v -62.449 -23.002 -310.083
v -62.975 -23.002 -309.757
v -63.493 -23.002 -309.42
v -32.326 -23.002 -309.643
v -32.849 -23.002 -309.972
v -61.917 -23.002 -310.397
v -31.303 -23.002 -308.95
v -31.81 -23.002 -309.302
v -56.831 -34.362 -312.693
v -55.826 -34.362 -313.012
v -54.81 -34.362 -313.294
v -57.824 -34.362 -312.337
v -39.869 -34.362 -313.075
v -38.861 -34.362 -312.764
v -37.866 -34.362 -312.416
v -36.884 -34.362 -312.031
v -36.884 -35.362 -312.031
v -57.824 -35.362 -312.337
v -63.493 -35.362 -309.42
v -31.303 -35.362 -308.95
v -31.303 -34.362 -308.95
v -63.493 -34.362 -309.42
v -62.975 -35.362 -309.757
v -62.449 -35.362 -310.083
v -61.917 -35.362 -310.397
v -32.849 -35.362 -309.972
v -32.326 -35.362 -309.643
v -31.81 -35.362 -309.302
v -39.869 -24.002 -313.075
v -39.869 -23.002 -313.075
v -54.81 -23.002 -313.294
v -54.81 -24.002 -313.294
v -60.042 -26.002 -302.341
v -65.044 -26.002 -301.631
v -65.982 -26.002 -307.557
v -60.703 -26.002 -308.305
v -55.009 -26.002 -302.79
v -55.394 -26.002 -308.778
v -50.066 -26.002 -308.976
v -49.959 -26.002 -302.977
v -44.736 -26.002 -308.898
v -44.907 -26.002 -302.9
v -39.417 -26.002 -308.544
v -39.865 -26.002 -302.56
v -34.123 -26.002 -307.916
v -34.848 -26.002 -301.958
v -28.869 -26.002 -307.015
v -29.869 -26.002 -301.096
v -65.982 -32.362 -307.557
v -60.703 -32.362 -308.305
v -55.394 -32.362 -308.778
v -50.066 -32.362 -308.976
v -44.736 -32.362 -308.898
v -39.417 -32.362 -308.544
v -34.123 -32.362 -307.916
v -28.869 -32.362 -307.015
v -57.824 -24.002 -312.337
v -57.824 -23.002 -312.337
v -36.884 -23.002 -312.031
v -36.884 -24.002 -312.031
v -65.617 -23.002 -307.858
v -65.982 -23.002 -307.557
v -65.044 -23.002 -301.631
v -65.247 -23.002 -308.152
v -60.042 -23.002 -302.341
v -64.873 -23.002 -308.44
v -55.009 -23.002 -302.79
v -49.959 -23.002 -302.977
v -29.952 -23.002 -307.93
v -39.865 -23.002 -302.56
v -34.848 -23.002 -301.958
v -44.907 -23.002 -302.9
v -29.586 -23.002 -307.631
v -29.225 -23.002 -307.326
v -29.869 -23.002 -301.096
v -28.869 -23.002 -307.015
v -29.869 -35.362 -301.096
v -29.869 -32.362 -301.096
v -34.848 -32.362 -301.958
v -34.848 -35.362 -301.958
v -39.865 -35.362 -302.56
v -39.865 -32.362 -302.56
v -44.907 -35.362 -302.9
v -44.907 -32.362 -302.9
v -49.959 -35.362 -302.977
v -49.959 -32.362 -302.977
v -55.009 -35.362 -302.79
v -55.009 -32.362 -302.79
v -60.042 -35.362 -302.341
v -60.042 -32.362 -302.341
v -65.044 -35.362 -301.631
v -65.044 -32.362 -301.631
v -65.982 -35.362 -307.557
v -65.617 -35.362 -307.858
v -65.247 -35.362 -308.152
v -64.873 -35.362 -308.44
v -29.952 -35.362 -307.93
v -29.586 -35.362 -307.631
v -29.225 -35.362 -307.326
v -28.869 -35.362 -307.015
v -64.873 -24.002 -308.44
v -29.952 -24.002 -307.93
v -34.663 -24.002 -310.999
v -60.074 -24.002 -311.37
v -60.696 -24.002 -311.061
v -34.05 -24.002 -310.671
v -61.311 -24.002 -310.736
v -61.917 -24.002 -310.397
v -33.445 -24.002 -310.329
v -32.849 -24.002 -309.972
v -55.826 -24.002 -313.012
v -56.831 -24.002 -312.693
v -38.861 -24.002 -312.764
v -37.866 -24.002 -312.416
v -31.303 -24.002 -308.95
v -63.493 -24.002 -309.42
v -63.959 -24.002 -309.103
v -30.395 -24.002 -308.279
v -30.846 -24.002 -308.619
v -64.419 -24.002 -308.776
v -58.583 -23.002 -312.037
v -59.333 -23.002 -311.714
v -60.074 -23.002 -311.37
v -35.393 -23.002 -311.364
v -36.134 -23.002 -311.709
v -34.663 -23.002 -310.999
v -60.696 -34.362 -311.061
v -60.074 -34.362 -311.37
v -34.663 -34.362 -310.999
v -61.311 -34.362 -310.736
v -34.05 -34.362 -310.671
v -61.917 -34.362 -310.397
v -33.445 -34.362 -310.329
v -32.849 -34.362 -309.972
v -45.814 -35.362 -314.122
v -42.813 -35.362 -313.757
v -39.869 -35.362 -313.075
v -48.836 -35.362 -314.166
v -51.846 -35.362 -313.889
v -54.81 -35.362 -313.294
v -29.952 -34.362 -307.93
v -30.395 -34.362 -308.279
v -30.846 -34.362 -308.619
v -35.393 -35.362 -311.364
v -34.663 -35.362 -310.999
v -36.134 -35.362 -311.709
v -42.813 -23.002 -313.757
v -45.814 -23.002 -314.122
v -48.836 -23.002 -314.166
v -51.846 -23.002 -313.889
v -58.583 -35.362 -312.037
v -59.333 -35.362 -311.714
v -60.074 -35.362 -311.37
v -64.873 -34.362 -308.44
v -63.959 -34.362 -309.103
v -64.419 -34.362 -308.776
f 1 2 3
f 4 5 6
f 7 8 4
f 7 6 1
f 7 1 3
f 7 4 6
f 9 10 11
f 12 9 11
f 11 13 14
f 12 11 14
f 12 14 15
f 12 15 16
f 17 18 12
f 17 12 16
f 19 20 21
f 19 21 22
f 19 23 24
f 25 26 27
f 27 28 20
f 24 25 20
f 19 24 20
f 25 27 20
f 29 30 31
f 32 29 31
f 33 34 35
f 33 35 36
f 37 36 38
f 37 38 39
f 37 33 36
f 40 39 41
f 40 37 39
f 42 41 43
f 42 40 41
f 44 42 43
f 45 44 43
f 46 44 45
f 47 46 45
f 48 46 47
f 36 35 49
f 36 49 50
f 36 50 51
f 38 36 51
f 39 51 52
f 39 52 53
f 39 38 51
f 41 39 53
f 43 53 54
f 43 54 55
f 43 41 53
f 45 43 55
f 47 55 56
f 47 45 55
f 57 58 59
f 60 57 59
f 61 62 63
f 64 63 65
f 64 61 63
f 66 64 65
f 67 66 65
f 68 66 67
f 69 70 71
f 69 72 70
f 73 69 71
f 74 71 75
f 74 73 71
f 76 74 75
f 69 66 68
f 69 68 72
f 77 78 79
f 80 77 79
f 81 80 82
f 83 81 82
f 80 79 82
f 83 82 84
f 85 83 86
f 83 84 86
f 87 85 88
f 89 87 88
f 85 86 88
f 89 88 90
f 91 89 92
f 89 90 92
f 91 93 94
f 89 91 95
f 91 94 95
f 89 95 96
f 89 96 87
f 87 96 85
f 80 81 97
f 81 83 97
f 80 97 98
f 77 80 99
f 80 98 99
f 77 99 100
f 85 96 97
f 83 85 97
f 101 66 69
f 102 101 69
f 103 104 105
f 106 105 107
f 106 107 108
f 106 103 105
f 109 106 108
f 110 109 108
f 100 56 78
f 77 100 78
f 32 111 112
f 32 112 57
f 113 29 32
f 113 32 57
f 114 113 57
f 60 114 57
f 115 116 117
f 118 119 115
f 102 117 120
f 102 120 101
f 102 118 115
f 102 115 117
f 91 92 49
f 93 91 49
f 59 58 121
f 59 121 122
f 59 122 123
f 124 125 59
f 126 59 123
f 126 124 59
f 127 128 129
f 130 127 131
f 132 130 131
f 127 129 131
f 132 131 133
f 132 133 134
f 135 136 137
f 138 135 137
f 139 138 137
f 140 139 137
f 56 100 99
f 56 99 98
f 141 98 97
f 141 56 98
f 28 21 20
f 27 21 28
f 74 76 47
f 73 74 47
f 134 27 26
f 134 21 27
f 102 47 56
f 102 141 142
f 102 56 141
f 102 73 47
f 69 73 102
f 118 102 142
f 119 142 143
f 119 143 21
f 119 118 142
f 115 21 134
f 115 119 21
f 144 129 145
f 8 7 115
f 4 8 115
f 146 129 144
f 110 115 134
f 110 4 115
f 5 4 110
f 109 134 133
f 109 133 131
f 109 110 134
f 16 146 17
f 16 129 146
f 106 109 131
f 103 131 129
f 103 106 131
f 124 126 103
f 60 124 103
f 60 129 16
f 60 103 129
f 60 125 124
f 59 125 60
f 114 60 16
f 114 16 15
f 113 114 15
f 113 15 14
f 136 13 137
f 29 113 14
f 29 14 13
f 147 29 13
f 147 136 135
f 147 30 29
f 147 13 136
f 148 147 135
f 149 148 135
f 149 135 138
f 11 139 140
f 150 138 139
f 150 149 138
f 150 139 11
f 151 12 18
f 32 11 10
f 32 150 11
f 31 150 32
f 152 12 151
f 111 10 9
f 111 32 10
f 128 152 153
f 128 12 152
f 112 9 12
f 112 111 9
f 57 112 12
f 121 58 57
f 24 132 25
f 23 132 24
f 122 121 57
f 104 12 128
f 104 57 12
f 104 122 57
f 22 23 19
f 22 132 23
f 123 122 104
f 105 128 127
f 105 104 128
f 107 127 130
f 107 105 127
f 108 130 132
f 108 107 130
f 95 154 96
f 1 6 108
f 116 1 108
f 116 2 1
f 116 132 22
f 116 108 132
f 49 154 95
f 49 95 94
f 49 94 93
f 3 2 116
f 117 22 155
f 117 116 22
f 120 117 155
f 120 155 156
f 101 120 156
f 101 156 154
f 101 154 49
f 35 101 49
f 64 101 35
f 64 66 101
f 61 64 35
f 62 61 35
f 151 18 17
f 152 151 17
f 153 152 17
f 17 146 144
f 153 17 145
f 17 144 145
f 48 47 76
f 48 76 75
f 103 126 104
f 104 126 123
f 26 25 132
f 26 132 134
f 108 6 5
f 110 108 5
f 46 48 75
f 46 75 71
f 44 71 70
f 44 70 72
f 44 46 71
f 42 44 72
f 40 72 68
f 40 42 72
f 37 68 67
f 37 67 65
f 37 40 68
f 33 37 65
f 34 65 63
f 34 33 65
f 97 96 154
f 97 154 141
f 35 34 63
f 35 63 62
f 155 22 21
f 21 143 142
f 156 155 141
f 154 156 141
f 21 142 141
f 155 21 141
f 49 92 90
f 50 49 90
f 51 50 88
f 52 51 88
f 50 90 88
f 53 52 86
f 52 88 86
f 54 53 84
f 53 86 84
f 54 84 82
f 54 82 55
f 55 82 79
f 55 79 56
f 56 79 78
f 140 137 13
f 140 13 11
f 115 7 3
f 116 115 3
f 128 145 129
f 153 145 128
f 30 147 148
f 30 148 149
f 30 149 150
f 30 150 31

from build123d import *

# Parameters (mm, degrees)
BOSS_EXTRUDE1_DEPTH = 3
BOSS_EXTRUDE2_START = -6.36
BOSS_EXTRUDE2_DEPTH = 3
BOSS_EXTRUDE3_START = -3
BOSS_EXTRUDE3_DEPTH = 12.36
CUT_EXTRUDE1_DEPTH  = 1


with BuildPart() as part:
    # Sketch1 → Boss-Extrude1 (new body)
    with BuildSketch(Plane.XZ.offset(32.361588827)):
        with BuildLine():
            Line((-28.868957331, -307.014773368), (-29.868957331, -301.096085324))
            ThreePointArc((-29.868957331, -301.096085324), (-47.432277428, -302.971340874), (-65.04446736, -301.630608989))
            Line((-65.04446736, -301.630608989), (-65.981716568, -307.557257918))
            ThreePointArc((-65.981716568, -307.557257918), (-47.400699357, -308.971536481), (-28.868957331, -307.014773368))
        make_face()
    extrude(amount=BOSS_EXTRUDE1_DEPTH)



with BuildPart() as body_2:
    # Sketch1<2> → Boss-Extrude2 (new body)
    with BuildSketch(Plane.XZ.offset(32.361588827).offset(BOSS_EXTRUDE2_START)):
        with BuildLine():
            Line((-28.868957331, -307.014773368), (-29.868957331, -301.096085324))
            ThreePointArc((-29.868957331, -301.096085324), (-47.432277428, -302.971340874), (-65.04446736, -301.630608989))
            Line((-65.04446736, -301.630608989), (-65.981716568, -307.557257918))
            ThreePointArc((-65.981716568, -307.557257918), (-47.400699357, -308.971536481), (-28.868957331, -307.014773368))
        make_face()
    extrude(amount=-BOSS_EXTRUDE2_DEPTH)


with BuildPart() as part_1:
    add(part.part)

    add(body_2.part)  # Boss-Extrude3 merges body 2
    # Sketch2 → Boss-Extrude3 (add)
    with BuildSketch(Plane(origin=(0, -26.001588827, 0), x_dir=(-1, 0, 0), z_dir=(0, -1, 0)).offset(BOSS_EXTRUDE3_START)):
        with BuildLine():
            ThreePointArc((65.981716568, 307.557257918), (47.400699357, 308.971536481), (28.868957331, 307.014773368))
            ThreePointArc((28.868957331, 307.014773368), (47.324504287, 314.184236637), (65.981716568, 307.557257918))
        make_face()
    extrude(amount=BOSS_EXTRUDE3_DEPTH)

    # Sketch4 → Cut-Extrude1 (cut)
    with BuildSketch(Plane(origin=(0, -23.001588827, 0), x_dir=(1, 0, 0), z_dir=(0, 1, 0))):
        with BuildLine():
            ThreePointArc((-63.492663367, 309.420035692), (-64.18989584, 308.940344318), (-64.87253134, 308.44009867))
            Line((-64.87253134, 308.44009867), (-29.951864875, 307.929656373))
            ThreePointArc((-29.951864875, 307.929656373), (-30.619587474, 308.449640474), (-31.302501574, 308.949505723))
            Line((-31.302501574, 308.949505723), (-63.492663367, 309.420035692))
        make_face()
        with BuildLine():
            ThreePointArc((-60.073849839, 311.370275869), (-61.00439253, 310.900603204), (-61.917080112, 310.397111905))
            Line((-61.917080112, 310.397111905), (-32.848853555, 309.972215882))
            ThreePointArc((-32.848853555, 309.972215882), (-33.746435087, 310.502168243), (-34.662852555, 310.99883829))
            Line((-34.662852555, 310.99883829), (-60.073849839, 311.370275869))
        make_face()
        with BuildLine():
            ThreePointArc((-54.80969362, 313.293542306), (-56.329988828, 312.857479245), (-57.823662491, 312.33749126))
            Line((-57.823662491, 312.33749126), (-36.88380863, 312.03140927))
            ThreePointArc((-36.88380863, 312.03140927), (-38.361645858, 312.594832417), (-39.868546228, 313.075144596))
            Line((-39.868546228, 313.075144596), (-54.80969362, 313.293542306))
        make_face()
    cut_extrude1 = extrude(amount=-CUT_EXTRUDE1_DEPTH, mode=Mode.SUBTRACT)

    # Mirror1: Cut-Extrude1 across plane
    add(cut_extrude1.mirror(Plane(origin=(0, -29.181588827, 0), x_dir=(0, 0, 1), z_dir=(0, -1, 0))), mode=Mode.SUBTRACT)


solid = part_1.part
